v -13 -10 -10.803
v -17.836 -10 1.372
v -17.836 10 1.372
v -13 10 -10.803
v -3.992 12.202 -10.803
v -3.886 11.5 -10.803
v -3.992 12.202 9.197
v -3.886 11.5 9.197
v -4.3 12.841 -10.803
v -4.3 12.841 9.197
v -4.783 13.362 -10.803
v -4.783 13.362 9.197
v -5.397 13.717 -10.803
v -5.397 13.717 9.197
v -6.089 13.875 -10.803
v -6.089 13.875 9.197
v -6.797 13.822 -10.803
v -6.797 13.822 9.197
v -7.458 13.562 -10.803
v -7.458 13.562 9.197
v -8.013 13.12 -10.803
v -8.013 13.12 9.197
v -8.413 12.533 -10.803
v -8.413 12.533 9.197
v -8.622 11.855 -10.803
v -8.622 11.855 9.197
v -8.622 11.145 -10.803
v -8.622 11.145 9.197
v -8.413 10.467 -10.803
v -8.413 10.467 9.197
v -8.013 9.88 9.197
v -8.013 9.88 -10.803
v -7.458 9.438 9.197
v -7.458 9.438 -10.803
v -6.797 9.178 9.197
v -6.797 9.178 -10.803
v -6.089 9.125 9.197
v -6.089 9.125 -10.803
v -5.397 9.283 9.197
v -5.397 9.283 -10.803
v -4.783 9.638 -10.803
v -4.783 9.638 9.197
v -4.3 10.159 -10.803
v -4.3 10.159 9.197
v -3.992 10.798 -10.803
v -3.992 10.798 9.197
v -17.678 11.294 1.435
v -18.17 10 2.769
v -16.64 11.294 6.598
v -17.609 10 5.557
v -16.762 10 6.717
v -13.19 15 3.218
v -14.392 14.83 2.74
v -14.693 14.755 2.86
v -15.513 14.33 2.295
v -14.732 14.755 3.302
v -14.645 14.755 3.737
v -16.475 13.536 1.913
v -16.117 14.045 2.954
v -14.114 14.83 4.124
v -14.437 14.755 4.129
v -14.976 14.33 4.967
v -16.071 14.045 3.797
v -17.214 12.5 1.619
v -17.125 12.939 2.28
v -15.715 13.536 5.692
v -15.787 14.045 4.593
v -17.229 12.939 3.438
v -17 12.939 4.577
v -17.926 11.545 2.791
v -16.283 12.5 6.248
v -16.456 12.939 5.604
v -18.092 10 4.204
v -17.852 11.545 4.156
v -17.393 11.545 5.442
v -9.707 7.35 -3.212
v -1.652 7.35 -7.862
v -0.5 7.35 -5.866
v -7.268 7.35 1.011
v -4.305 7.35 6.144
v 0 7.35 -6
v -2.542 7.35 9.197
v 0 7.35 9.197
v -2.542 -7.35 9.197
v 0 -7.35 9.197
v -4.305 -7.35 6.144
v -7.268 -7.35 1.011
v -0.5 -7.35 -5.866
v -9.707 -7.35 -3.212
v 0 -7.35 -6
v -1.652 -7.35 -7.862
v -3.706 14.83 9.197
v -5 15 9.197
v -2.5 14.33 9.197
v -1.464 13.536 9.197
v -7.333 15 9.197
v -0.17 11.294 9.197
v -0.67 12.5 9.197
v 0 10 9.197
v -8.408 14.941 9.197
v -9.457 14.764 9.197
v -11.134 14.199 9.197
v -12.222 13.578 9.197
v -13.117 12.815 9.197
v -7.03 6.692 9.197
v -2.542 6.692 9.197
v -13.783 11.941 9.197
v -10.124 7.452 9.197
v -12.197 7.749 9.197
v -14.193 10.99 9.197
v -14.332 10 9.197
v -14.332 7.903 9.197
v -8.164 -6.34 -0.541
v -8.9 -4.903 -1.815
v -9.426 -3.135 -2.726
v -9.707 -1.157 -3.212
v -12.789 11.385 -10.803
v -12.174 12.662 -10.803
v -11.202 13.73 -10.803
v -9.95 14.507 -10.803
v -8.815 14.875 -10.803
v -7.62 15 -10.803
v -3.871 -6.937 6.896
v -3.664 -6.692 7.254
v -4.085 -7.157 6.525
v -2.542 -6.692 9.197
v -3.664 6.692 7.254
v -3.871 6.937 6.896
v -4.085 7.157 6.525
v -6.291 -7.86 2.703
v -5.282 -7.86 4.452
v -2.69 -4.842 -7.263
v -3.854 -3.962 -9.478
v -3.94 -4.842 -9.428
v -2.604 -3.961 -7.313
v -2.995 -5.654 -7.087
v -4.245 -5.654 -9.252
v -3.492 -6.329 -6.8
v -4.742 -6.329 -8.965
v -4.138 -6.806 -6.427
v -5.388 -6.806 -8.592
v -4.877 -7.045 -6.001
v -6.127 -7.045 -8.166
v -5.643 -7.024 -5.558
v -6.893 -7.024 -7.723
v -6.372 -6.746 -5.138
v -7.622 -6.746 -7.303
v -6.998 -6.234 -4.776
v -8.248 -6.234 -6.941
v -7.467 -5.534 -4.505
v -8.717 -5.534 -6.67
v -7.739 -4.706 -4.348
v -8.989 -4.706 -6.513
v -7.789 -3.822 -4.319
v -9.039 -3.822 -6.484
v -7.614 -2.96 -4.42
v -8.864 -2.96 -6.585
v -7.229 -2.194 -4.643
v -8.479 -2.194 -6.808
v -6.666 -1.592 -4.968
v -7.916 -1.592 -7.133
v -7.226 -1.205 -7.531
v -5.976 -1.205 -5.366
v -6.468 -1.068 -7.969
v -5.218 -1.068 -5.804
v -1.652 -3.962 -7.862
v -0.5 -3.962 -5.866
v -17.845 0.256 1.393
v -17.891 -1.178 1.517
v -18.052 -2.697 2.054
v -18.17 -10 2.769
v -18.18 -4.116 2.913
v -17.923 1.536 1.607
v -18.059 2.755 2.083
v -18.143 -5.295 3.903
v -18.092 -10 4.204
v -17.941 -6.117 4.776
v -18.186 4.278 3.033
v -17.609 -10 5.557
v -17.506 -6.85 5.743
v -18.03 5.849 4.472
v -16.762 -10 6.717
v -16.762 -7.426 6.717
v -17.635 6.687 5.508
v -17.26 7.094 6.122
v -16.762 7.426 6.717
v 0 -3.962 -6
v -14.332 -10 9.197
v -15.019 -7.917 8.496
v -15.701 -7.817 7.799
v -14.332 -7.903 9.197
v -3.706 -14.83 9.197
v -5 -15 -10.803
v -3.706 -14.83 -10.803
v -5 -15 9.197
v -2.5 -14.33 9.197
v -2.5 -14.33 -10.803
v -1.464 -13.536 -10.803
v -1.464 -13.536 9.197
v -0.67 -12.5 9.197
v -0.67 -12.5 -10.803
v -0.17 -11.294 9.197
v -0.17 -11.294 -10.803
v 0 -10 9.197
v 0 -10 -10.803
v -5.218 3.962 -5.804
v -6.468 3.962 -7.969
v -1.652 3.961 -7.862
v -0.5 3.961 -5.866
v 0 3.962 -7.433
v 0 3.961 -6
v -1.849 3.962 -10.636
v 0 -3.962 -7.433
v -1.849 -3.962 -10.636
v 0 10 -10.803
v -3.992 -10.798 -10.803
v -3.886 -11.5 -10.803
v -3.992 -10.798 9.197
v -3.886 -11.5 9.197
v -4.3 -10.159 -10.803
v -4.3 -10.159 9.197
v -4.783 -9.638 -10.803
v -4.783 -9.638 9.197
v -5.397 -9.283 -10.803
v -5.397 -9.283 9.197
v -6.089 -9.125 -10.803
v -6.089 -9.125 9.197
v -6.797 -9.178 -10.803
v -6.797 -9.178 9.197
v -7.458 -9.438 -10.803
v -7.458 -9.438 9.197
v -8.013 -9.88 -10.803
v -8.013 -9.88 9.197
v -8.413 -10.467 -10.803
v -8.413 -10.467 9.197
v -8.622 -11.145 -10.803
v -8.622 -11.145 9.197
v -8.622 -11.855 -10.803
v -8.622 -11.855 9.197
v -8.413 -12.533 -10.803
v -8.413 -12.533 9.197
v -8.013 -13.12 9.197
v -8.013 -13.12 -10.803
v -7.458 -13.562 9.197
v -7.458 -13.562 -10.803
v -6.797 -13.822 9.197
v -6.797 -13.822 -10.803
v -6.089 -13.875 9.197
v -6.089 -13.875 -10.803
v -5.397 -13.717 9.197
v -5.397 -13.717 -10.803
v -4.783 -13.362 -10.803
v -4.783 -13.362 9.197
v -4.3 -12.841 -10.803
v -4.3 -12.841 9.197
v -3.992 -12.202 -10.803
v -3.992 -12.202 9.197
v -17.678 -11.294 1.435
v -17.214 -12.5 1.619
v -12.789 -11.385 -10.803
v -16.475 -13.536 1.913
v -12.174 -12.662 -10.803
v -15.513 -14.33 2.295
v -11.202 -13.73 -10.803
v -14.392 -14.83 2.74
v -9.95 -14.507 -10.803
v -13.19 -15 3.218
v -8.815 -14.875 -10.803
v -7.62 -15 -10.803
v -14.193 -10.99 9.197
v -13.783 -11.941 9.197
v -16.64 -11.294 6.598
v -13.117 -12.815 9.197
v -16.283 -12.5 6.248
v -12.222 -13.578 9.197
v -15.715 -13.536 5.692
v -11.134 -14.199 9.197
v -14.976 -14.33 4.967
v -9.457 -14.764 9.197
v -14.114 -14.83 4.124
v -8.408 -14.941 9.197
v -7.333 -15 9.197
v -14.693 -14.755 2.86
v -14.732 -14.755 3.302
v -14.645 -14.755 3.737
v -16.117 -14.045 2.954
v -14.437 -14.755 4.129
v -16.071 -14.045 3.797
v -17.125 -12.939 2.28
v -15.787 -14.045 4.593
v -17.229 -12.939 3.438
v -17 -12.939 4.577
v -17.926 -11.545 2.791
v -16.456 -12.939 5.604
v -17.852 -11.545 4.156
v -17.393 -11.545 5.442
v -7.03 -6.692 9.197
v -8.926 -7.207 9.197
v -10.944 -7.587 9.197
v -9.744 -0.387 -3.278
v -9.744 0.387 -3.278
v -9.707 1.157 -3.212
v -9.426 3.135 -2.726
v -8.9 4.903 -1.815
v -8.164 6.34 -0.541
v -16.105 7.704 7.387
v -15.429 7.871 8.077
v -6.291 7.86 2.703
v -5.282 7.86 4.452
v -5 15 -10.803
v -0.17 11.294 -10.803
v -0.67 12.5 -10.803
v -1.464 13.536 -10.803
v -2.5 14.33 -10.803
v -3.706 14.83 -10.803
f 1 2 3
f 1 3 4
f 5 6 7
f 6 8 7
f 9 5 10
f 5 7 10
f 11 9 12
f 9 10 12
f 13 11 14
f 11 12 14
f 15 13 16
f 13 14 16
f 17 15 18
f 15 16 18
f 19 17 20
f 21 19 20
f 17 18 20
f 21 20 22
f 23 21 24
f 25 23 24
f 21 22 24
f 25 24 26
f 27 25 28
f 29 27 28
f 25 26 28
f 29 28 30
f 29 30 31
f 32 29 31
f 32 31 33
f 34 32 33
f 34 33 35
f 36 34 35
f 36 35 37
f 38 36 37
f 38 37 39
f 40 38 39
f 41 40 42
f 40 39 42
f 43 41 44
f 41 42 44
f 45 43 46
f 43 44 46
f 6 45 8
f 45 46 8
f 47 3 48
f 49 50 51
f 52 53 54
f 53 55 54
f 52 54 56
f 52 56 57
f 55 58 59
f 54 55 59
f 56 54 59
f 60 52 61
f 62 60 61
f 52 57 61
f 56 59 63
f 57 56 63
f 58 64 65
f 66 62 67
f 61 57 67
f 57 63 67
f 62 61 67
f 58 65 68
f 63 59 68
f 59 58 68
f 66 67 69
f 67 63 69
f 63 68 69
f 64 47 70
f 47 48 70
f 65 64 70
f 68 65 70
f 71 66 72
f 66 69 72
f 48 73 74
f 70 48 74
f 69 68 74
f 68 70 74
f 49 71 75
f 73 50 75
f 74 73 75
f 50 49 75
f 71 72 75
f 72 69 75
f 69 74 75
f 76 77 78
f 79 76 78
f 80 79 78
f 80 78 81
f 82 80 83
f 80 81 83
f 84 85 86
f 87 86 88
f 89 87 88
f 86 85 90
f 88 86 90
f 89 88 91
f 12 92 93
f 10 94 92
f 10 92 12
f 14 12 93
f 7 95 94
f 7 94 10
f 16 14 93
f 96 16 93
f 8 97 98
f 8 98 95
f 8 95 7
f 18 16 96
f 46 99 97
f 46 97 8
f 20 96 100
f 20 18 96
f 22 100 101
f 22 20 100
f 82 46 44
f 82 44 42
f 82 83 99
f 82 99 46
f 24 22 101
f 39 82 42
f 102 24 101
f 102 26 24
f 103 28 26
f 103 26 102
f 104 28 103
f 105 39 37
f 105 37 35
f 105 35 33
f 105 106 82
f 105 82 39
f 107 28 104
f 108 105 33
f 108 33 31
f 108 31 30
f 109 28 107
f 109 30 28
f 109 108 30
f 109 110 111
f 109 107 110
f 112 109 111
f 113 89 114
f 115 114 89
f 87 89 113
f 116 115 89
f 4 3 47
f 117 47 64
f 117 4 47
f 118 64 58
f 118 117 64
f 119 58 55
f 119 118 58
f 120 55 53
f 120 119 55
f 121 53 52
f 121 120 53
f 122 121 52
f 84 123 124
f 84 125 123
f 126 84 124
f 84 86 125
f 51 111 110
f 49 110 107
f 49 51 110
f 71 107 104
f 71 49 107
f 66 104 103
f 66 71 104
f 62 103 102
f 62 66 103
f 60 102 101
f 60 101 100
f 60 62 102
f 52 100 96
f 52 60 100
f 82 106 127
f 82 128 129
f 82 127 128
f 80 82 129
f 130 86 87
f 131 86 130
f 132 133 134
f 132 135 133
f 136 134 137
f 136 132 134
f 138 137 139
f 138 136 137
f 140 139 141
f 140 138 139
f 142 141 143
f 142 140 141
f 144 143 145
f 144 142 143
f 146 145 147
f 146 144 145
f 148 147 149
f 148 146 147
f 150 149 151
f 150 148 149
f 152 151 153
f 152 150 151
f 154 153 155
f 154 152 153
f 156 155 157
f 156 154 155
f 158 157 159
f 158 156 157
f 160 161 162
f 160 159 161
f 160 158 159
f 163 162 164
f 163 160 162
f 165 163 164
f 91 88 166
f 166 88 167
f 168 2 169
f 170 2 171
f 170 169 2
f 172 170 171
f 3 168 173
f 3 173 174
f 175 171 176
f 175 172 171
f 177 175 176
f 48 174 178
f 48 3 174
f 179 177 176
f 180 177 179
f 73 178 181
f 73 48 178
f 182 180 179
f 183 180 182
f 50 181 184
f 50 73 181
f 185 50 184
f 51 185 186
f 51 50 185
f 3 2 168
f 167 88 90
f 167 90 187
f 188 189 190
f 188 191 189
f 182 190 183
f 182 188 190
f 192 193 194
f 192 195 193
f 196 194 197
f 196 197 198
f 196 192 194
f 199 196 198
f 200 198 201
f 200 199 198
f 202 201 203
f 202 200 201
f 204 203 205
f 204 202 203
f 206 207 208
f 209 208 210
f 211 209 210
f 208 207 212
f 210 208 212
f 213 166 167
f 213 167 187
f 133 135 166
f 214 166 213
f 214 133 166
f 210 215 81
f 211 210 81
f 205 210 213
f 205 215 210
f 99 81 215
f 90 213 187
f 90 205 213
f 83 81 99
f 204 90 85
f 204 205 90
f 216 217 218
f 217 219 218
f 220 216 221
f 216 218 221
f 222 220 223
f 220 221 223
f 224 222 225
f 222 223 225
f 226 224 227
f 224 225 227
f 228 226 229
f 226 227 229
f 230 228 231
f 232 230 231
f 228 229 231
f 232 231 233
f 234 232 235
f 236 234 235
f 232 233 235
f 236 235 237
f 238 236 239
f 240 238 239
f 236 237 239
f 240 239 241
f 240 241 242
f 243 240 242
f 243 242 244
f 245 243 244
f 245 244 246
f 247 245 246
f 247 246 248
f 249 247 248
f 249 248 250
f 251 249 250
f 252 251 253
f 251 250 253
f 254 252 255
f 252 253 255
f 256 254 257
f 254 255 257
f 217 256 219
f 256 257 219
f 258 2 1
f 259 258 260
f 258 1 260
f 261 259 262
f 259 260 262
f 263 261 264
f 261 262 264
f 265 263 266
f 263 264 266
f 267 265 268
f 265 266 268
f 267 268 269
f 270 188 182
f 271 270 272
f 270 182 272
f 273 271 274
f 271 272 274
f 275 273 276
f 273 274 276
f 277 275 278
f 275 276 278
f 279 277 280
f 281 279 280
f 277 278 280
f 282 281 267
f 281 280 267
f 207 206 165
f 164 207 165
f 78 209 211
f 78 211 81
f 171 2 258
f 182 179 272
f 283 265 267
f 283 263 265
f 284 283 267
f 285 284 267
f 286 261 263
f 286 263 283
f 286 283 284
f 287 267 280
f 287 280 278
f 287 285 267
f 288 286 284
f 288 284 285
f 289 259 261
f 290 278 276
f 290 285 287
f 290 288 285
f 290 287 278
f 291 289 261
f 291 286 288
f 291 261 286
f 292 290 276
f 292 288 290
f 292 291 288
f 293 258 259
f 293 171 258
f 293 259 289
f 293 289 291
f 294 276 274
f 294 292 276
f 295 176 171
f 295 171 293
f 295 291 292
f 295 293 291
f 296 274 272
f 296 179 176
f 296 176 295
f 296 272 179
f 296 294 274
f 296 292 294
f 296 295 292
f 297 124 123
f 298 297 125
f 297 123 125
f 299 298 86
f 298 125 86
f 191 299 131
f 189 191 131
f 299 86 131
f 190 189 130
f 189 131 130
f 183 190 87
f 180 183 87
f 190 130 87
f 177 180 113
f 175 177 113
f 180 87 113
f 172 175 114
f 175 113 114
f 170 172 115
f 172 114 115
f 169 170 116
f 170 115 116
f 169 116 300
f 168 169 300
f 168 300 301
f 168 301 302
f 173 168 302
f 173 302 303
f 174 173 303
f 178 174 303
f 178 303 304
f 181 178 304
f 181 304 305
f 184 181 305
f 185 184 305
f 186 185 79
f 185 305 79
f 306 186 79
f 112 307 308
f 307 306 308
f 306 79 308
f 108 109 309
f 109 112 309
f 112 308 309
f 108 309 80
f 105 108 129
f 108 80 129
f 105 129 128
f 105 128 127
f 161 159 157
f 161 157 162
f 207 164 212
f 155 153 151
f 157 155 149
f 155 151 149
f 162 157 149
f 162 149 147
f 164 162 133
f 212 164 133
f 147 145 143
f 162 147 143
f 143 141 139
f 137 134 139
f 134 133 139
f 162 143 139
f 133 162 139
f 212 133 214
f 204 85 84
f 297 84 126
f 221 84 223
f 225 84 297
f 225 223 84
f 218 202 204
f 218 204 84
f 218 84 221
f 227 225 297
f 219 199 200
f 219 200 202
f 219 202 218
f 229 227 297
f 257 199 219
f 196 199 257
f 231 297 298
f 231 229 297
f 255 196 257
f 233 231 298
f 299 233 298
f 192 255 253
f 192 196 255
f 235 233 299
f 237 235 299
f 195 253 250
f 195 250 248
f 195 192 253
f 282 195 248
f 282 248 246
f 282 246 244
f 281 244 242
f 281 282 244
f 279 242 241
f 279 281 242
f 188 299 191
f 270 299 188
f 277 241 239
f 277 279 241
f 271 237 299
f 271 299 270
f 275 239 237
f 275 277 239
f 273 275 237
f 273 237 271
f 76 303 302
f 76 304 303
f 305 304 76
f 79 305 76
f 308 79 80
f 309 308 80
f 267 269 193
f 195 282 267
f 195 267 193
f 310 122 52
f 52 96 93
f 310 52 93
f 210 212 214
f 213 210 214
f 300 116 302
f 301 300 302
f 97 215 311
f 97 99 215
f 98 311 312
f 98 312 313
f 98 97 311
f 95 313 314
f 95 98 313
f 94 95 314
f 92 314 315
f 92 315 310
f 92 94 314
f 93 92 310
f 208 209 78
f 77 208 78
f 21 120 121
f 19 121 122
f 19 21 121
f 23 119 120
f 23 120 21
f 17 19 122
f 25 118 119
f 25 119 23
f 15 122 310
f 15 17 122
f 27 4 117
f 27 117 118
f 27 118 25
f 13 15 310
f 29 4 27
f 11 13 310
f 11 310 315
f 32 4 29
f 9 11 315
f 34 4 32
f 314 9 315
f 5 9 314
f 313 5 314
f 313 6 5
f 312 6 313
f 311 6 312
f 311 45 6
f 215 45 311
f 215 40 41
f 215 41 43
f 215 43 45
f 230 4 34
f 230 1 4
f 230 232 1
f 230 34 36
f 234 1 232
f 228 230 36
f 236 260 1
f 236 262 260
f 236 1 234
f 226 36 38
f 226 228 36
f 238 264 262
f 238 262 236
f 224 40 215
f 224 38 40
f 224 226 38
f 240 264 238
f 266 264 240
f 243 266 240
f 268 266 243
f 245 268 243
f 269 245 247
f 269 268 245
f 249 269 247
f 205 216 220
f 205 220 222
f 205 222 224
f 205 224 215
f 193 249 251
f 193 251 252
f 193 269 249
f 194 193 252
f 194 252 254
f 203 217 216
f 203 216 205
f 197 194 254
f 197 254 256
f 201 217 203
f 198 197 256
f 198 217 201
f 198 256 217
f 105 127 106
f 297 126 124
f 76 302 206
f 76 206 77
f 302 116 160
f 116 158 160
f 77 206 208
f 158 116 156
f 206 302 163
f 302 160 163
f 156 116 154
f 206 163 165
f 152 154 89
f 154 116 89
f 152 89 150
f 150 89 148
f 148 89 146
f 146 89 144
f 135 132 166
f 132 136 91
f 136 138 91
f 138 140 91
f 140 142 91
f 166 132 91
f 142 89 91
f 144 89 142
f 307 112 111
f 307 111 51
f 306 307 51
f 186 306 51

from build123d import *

# Parameters (mm, degrees)
F1_DEPTH       = 15
F1_DEPTH_BACK  = 15
F6_R           = 5
F5_R           = 2.38125
F7_DEPTH       = 25
F7_DEPTH_BACK  = 25
F10_DEPTH      = 9.3
F11_START      = -9.3
F11_DEPTH      = 15.7
F12_SIZE       = 1
F14_R          = 3
F16_DEPTH      = 2.5
F15_W          = 5.334
F15_H          = 7.923
F17_DEPTH      = 25
F17_DEPTH_BACK = 2.5


with BuildPart() as f1:
    # F0 (on Front) → F1 (new body, two sides)
    with BuildSketch(Plane.XZ) as f1_sk:
        Polygon((-13, -10.8026722446), (0, -10.8026722446), (0, 9.1973277554), (-14.3321100622, 9.1973277554), (-19.0368395666, 4.3939077003), align=None)
    extrude(amount=F1_DEPTH)
    extrude(f1_sk.sketch, amount=-F1_DEPTH_BACK)

    # F6
    f6_edges = [f1.edges().sort_by_distance(p)[0] for p in [
        (-19.03684, 0, 4.393908),
        (-16.01842, -15, -3.204382),
        (-16.01842, 15, -3.204382),
        (-16.684475, -15, 6.795618),
        (-16.684475, 15, 6.795618),
        (0, -15, -0.802672),
        (0, 15, -0.802672),
    ]]
    fillet(f6_edges, radius=F6_R)

    # F5 (on Top) → F7 (cut, two sides)
    with BuildSketch(Plane.XY) as f7_sk:
        with Locations((-6.2674125656, -11.5)):
            Circle(F5_R)
        with Locations((-6.2674125656, 11.5)):
            Circle(F5_R)
    extrude(amount=-F7_DEPTH, mode=Mode.SUBTRACT)
    extrude(f7_sk.sketch, amount=F7_DEPTH_BACK, mode=Mode.SUBTRACT)

    # F9 (on face) → F10 (cut)
    with BuildSketch(Plane(origin=(2.1650635095, 0, -1.25), x_dir=(0, 1, 0), z_dir=(0.8660254038, 0, -0.5))):
        Polygon((-7.35, -7.6351069248), (7.35, -7.6351069248), (7.35, 8.0451745412), (7.35, 12.5973122194), (-7.35, 12.5973122194), (-7.35, 8.0451745412), align=None)
    extrude(amount=-F10_DEPTH, mode=Mode.SUBTRACT)

    # F8 (on face) → F11 (cut)
    with BuildSketch(Plane(origin=(2.1650635095, 0, -1.25), x_dir=(0, 1, 0), z_dir=(0.8660254038, 0, -0.5)).offset(F11_START)):
        with BuildLine():
            Line((-6.6921999912, 12.0207928121), (-6.6921999912, 4.4500407902))
            ThreePointArc((-6.6921999912, 4.4500407902), (0, -7.7199661918), (6.6921999912, 4.4500407902))
            Line((6.6921999912, 4.4500407902), (6.6921999912, 12.0207928121))
            Line((6.6921999912, 12.0207928121), (-6.6921999912, 12.0207928121))
        make_face()
    extrude(amount=-F11_DEPTH, mode=Mode.SUBTRACT)

    # F12
    f12_edges = [f1.edges().sort_by_distance(p)[0] for p in [
        (0, 0, -5),
    ]]
    chamfer(f12_edges, length=F12_SIZE)

    # F14 (on face) → F16 (cut)
    with BuildSketch(Plane(origin=(-3.8175534624, 0, -6.6121965575), x_dir=(0.8660254038, 0, -0.5), z_dir=(-0.5, 0, -0.8660254038))):
        with Locations((-1.596442773, 4.0683373809)):
            Circle(F14_R)
    extrude(amount=F16_DEPTH, mode=Mode.SUBTRACT)

    # F15 (on face) → F17 (cut, two sides)
    with BuildSketch(Plane(origin=(-3.8175534624, 0, -6.6121965575), x_dir=(0.8660254038, 0, -0.5), z_dir=(-0.5, 0, -0.8660254038))) as f17_sk:
        with Locations((1.0496865725, 0)):
            Rectangle(F15_W, F15_H)
    extrude(amount=-F17_DEPTH, mode=Mode.SUBTRACT)
    extrude(f17_sk.sketch, amount=F17_DEPTH_BACK, mode=Mode.SUBTRACT)


solid = f1.part
